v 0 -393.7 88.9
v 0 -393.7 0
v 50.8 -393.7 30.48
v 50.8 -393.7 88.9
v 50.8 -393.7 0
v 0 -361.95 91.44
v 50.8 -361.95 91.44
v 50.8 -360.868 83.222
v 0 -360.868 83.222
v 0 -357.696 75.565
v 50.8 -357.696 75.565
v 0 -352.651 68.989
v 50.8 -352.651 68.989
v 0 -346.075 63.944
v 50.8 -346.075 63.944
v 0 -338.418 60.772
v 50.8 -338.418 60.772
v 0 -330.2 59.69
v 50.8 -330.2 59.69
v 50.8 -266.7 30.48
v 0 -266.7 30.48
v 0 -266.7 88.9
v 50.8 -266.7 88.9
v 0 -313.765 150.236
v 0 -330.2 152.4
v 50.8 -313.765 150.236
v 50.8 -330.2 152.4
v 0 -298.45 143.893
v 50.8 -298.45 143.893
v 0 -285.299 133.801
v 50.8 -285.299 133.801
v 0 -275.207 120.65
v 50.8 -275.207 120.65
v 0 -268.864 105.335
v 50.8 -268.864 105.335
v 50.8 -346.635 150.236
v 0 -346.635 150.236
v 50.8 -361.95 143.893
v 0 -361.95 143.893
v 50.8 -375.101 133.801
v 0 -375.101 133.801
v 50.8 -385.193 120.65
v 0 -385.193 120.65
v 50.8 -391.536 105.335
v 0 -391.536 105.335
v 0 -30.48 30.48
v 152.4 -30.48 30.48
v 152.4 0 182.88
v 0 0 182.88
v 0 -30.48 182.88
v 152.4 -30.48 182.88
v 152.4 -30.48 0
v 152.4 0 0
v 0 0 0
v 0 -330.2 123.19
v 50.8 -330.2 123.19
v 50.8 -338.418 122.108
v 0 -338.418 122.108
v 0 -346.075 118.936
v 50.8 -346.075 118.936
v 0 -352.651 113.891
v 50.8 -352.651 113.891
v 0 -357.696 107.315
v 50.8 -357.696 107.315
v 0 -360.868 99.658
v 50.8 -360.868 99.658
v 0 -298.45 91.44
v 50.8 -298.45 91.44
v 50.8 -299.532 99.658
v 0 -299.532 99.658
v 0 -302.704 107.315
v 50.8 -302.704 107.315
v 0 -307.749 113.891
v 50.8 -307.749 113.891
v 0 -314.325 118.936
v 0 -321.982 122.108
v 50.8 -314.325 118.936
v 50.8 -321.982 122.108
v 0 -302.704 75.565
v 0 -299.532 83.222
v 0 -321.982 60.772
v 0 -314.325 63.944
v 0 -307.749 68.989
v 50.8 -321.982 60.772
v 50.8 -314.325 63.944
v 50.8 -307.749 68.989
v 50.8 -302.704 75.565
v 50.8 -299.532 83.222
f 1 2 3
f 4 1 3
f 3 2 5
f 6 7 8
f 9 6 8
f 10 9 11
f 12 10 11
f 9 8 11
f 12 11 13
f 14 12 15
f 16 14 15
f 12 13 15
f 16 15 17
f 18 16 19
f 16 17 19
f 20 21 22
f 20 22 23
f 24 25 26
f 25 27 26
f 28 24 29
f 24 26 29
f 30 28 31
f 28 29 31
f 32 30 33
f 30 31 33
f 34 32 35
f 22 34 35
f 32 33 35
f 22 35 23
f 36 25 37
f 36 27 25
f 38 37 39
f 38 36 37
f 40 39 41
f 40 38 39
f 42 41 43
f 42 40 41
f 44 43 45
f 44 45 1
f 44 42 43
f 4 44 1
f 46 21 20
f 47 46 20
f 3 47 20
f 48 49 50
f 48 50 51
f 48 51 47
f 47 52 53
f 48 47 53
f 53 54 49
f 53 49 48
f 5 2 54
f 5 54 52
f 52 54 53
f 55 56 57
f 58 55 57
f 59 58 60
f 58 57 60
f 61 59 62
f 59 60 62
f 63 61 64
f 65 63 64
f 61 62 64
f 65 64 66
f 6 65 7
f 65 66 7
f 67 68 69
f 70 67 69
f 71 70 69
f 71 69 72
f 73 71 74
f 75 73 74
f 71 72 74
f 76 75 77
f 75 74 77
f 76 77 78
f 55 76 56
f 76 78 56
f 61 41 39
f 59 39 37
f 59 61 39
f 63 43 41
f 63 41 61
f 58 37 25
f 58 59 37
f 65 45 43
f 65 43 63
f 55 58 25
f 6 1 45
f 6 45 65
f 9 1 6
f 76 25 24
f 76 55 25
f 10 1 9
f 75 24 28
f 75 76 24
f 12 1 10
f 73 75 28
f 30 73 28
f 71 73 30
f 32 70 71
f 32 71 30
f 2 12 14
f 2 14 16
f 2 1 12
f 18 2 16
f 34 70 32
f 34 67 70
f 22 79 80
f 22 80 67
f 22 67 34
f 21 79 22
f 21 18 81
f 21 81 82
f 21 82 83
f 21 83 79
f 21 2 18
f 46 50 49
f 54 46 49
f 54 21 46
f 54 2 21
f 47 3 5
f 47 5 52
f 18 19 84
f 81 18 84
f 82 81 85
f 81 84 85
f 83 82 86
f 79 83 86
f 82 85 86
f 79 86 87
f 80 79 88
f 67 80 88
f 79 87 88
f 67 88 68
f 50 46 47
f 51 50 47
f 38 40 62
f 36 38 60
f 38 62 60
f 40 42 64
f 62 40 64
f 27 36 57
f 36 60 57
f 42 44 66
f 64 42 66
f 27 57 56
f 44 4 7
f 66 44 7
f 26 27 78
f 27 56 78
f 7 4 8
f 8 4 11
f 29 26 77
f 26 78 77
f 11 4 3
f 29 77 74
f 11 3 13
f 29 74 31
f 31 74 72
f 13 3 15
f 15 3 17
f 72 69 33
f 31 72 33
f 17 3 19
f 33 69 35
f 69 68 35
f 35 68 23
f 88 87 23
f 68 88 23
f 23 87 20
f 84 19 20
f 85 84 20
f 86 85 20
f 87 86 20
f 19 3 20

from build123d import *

# Parameters (mm, degrees)
F1_DEPTH  = 30.48
F3_DEPTH  = 30.48
F5_DEPTH  = 30.48
F6_W      = 152.4
F6_H      = 30.48
F7_DEPTH  = 152.4
F8_W      = 50.8
F8_H      = 127
F9_DEPTH  = 121.92
F11_DEPTH = 475.742
F12_R     = 63.49999


# Not quite as in the source:
# - a fillet or chamfer is up to 0.001 mm smaller than in the source, because OpenCascade refuses the exact size


with BuildPart() as f1:
    # F0 (on Top) → F1 (new body)
    with BuildSketch(Plane.XY):
        Polygon((152.4, 0), (0, 0), (0, -393.7), (50.8, -393.7), align=None)
    extrude(amount=F1_DEPTH)

    # F2 (on face) → F3 (join)
    with BuildSketch(Plane.XY.offset(30.48)):
        Polygon((152.4, -30.48), (152.4, 0), (144.5341935484, -30.48), align=None)
    extrude(amount=-F3_DEPTH)

    # F4 (on face) → F5 (join)
    with BuildSketch(Plane.XY.offset(30.48)):
        Polygon((50.8, -393.7), (152.4, -30.48), (144.5341935484, -30.48), align=None)
    extrude(amount=-F5_DEPTH)

    # F6 (on face) → F7 (join)
    with BuildSketch(Plane.XY.offset(30.48)):
        with Locations((76.2, -15.24)):
            Rectangle(F6_W, F6_H)
    extrude(amount=F7_DEPTH)

    # F8 (on face) → F9 (join)
    with BuildSketch(Plane.XY.offset(30.48)):
        with Locations((25.4, -330.2)):
            Rectangle(F8_W, F8_H)
    extrude(amount=F9_DEPTH)

    # F10 (on face) → F11 (cut)
    with BuildSketch(Plane.YZ.offset(50.8)):
        with BuildLine():
            Line((-330.2, 91.44), (-330.2, 123.19))
            ThreePointArc((-330.2, 123.19), (-352.6506403027, 113.8906403027), (-361.95, 91.44))
            Line((-361.95, 91.44), (-330.2, 91.44))
        make_face()
        with BuildLine():
            ThreePointArc((-298.45, 91.44), (-307.7493596973, 113.8906403027), (-330.2, 123.19))
            Line((-330.2, 123.19), (-330.2, 91.44))
            Line((-330.2, 91.44), (-298.45, 91.44))
        make_face()
        with BuildLine():
            Line((-330.2, 59.69), (-330.2, 91.44))
            Line((-330.2, 91.44), (-361.95, 91.44))
            ThreePointArc((-361.95, 91.44), (-352.6506403027, 68.9893596973), (-330.2, 59.69))
        make_face()
        with BuildLine():
            ThreePointArc((-330.2, 59.69), (-307.7493596973, 68.9893596973), (-298.45, 91.44))
            Line((-298.45, 91.44), (-330.2, 91.44))
            Line((-330.2, 91.44), (-330.2, 59.69))
        make_face()
    extrude(amount=-F11_DEPTH, mode=Mode.SUBTRACT)

    # F12 (radius 63.5 in the source; OpenCascade refuses exactly that, so slightly less here)
    f12_edges = [f1.edges().sort_by_distance(p)[0] for p in [
        (25.4, -393.7, 152.4),
        (25.4, -266.7, 152.4),
    ]]
    fillet(f12_edges, radius=F12_R)


solid = f1.part
